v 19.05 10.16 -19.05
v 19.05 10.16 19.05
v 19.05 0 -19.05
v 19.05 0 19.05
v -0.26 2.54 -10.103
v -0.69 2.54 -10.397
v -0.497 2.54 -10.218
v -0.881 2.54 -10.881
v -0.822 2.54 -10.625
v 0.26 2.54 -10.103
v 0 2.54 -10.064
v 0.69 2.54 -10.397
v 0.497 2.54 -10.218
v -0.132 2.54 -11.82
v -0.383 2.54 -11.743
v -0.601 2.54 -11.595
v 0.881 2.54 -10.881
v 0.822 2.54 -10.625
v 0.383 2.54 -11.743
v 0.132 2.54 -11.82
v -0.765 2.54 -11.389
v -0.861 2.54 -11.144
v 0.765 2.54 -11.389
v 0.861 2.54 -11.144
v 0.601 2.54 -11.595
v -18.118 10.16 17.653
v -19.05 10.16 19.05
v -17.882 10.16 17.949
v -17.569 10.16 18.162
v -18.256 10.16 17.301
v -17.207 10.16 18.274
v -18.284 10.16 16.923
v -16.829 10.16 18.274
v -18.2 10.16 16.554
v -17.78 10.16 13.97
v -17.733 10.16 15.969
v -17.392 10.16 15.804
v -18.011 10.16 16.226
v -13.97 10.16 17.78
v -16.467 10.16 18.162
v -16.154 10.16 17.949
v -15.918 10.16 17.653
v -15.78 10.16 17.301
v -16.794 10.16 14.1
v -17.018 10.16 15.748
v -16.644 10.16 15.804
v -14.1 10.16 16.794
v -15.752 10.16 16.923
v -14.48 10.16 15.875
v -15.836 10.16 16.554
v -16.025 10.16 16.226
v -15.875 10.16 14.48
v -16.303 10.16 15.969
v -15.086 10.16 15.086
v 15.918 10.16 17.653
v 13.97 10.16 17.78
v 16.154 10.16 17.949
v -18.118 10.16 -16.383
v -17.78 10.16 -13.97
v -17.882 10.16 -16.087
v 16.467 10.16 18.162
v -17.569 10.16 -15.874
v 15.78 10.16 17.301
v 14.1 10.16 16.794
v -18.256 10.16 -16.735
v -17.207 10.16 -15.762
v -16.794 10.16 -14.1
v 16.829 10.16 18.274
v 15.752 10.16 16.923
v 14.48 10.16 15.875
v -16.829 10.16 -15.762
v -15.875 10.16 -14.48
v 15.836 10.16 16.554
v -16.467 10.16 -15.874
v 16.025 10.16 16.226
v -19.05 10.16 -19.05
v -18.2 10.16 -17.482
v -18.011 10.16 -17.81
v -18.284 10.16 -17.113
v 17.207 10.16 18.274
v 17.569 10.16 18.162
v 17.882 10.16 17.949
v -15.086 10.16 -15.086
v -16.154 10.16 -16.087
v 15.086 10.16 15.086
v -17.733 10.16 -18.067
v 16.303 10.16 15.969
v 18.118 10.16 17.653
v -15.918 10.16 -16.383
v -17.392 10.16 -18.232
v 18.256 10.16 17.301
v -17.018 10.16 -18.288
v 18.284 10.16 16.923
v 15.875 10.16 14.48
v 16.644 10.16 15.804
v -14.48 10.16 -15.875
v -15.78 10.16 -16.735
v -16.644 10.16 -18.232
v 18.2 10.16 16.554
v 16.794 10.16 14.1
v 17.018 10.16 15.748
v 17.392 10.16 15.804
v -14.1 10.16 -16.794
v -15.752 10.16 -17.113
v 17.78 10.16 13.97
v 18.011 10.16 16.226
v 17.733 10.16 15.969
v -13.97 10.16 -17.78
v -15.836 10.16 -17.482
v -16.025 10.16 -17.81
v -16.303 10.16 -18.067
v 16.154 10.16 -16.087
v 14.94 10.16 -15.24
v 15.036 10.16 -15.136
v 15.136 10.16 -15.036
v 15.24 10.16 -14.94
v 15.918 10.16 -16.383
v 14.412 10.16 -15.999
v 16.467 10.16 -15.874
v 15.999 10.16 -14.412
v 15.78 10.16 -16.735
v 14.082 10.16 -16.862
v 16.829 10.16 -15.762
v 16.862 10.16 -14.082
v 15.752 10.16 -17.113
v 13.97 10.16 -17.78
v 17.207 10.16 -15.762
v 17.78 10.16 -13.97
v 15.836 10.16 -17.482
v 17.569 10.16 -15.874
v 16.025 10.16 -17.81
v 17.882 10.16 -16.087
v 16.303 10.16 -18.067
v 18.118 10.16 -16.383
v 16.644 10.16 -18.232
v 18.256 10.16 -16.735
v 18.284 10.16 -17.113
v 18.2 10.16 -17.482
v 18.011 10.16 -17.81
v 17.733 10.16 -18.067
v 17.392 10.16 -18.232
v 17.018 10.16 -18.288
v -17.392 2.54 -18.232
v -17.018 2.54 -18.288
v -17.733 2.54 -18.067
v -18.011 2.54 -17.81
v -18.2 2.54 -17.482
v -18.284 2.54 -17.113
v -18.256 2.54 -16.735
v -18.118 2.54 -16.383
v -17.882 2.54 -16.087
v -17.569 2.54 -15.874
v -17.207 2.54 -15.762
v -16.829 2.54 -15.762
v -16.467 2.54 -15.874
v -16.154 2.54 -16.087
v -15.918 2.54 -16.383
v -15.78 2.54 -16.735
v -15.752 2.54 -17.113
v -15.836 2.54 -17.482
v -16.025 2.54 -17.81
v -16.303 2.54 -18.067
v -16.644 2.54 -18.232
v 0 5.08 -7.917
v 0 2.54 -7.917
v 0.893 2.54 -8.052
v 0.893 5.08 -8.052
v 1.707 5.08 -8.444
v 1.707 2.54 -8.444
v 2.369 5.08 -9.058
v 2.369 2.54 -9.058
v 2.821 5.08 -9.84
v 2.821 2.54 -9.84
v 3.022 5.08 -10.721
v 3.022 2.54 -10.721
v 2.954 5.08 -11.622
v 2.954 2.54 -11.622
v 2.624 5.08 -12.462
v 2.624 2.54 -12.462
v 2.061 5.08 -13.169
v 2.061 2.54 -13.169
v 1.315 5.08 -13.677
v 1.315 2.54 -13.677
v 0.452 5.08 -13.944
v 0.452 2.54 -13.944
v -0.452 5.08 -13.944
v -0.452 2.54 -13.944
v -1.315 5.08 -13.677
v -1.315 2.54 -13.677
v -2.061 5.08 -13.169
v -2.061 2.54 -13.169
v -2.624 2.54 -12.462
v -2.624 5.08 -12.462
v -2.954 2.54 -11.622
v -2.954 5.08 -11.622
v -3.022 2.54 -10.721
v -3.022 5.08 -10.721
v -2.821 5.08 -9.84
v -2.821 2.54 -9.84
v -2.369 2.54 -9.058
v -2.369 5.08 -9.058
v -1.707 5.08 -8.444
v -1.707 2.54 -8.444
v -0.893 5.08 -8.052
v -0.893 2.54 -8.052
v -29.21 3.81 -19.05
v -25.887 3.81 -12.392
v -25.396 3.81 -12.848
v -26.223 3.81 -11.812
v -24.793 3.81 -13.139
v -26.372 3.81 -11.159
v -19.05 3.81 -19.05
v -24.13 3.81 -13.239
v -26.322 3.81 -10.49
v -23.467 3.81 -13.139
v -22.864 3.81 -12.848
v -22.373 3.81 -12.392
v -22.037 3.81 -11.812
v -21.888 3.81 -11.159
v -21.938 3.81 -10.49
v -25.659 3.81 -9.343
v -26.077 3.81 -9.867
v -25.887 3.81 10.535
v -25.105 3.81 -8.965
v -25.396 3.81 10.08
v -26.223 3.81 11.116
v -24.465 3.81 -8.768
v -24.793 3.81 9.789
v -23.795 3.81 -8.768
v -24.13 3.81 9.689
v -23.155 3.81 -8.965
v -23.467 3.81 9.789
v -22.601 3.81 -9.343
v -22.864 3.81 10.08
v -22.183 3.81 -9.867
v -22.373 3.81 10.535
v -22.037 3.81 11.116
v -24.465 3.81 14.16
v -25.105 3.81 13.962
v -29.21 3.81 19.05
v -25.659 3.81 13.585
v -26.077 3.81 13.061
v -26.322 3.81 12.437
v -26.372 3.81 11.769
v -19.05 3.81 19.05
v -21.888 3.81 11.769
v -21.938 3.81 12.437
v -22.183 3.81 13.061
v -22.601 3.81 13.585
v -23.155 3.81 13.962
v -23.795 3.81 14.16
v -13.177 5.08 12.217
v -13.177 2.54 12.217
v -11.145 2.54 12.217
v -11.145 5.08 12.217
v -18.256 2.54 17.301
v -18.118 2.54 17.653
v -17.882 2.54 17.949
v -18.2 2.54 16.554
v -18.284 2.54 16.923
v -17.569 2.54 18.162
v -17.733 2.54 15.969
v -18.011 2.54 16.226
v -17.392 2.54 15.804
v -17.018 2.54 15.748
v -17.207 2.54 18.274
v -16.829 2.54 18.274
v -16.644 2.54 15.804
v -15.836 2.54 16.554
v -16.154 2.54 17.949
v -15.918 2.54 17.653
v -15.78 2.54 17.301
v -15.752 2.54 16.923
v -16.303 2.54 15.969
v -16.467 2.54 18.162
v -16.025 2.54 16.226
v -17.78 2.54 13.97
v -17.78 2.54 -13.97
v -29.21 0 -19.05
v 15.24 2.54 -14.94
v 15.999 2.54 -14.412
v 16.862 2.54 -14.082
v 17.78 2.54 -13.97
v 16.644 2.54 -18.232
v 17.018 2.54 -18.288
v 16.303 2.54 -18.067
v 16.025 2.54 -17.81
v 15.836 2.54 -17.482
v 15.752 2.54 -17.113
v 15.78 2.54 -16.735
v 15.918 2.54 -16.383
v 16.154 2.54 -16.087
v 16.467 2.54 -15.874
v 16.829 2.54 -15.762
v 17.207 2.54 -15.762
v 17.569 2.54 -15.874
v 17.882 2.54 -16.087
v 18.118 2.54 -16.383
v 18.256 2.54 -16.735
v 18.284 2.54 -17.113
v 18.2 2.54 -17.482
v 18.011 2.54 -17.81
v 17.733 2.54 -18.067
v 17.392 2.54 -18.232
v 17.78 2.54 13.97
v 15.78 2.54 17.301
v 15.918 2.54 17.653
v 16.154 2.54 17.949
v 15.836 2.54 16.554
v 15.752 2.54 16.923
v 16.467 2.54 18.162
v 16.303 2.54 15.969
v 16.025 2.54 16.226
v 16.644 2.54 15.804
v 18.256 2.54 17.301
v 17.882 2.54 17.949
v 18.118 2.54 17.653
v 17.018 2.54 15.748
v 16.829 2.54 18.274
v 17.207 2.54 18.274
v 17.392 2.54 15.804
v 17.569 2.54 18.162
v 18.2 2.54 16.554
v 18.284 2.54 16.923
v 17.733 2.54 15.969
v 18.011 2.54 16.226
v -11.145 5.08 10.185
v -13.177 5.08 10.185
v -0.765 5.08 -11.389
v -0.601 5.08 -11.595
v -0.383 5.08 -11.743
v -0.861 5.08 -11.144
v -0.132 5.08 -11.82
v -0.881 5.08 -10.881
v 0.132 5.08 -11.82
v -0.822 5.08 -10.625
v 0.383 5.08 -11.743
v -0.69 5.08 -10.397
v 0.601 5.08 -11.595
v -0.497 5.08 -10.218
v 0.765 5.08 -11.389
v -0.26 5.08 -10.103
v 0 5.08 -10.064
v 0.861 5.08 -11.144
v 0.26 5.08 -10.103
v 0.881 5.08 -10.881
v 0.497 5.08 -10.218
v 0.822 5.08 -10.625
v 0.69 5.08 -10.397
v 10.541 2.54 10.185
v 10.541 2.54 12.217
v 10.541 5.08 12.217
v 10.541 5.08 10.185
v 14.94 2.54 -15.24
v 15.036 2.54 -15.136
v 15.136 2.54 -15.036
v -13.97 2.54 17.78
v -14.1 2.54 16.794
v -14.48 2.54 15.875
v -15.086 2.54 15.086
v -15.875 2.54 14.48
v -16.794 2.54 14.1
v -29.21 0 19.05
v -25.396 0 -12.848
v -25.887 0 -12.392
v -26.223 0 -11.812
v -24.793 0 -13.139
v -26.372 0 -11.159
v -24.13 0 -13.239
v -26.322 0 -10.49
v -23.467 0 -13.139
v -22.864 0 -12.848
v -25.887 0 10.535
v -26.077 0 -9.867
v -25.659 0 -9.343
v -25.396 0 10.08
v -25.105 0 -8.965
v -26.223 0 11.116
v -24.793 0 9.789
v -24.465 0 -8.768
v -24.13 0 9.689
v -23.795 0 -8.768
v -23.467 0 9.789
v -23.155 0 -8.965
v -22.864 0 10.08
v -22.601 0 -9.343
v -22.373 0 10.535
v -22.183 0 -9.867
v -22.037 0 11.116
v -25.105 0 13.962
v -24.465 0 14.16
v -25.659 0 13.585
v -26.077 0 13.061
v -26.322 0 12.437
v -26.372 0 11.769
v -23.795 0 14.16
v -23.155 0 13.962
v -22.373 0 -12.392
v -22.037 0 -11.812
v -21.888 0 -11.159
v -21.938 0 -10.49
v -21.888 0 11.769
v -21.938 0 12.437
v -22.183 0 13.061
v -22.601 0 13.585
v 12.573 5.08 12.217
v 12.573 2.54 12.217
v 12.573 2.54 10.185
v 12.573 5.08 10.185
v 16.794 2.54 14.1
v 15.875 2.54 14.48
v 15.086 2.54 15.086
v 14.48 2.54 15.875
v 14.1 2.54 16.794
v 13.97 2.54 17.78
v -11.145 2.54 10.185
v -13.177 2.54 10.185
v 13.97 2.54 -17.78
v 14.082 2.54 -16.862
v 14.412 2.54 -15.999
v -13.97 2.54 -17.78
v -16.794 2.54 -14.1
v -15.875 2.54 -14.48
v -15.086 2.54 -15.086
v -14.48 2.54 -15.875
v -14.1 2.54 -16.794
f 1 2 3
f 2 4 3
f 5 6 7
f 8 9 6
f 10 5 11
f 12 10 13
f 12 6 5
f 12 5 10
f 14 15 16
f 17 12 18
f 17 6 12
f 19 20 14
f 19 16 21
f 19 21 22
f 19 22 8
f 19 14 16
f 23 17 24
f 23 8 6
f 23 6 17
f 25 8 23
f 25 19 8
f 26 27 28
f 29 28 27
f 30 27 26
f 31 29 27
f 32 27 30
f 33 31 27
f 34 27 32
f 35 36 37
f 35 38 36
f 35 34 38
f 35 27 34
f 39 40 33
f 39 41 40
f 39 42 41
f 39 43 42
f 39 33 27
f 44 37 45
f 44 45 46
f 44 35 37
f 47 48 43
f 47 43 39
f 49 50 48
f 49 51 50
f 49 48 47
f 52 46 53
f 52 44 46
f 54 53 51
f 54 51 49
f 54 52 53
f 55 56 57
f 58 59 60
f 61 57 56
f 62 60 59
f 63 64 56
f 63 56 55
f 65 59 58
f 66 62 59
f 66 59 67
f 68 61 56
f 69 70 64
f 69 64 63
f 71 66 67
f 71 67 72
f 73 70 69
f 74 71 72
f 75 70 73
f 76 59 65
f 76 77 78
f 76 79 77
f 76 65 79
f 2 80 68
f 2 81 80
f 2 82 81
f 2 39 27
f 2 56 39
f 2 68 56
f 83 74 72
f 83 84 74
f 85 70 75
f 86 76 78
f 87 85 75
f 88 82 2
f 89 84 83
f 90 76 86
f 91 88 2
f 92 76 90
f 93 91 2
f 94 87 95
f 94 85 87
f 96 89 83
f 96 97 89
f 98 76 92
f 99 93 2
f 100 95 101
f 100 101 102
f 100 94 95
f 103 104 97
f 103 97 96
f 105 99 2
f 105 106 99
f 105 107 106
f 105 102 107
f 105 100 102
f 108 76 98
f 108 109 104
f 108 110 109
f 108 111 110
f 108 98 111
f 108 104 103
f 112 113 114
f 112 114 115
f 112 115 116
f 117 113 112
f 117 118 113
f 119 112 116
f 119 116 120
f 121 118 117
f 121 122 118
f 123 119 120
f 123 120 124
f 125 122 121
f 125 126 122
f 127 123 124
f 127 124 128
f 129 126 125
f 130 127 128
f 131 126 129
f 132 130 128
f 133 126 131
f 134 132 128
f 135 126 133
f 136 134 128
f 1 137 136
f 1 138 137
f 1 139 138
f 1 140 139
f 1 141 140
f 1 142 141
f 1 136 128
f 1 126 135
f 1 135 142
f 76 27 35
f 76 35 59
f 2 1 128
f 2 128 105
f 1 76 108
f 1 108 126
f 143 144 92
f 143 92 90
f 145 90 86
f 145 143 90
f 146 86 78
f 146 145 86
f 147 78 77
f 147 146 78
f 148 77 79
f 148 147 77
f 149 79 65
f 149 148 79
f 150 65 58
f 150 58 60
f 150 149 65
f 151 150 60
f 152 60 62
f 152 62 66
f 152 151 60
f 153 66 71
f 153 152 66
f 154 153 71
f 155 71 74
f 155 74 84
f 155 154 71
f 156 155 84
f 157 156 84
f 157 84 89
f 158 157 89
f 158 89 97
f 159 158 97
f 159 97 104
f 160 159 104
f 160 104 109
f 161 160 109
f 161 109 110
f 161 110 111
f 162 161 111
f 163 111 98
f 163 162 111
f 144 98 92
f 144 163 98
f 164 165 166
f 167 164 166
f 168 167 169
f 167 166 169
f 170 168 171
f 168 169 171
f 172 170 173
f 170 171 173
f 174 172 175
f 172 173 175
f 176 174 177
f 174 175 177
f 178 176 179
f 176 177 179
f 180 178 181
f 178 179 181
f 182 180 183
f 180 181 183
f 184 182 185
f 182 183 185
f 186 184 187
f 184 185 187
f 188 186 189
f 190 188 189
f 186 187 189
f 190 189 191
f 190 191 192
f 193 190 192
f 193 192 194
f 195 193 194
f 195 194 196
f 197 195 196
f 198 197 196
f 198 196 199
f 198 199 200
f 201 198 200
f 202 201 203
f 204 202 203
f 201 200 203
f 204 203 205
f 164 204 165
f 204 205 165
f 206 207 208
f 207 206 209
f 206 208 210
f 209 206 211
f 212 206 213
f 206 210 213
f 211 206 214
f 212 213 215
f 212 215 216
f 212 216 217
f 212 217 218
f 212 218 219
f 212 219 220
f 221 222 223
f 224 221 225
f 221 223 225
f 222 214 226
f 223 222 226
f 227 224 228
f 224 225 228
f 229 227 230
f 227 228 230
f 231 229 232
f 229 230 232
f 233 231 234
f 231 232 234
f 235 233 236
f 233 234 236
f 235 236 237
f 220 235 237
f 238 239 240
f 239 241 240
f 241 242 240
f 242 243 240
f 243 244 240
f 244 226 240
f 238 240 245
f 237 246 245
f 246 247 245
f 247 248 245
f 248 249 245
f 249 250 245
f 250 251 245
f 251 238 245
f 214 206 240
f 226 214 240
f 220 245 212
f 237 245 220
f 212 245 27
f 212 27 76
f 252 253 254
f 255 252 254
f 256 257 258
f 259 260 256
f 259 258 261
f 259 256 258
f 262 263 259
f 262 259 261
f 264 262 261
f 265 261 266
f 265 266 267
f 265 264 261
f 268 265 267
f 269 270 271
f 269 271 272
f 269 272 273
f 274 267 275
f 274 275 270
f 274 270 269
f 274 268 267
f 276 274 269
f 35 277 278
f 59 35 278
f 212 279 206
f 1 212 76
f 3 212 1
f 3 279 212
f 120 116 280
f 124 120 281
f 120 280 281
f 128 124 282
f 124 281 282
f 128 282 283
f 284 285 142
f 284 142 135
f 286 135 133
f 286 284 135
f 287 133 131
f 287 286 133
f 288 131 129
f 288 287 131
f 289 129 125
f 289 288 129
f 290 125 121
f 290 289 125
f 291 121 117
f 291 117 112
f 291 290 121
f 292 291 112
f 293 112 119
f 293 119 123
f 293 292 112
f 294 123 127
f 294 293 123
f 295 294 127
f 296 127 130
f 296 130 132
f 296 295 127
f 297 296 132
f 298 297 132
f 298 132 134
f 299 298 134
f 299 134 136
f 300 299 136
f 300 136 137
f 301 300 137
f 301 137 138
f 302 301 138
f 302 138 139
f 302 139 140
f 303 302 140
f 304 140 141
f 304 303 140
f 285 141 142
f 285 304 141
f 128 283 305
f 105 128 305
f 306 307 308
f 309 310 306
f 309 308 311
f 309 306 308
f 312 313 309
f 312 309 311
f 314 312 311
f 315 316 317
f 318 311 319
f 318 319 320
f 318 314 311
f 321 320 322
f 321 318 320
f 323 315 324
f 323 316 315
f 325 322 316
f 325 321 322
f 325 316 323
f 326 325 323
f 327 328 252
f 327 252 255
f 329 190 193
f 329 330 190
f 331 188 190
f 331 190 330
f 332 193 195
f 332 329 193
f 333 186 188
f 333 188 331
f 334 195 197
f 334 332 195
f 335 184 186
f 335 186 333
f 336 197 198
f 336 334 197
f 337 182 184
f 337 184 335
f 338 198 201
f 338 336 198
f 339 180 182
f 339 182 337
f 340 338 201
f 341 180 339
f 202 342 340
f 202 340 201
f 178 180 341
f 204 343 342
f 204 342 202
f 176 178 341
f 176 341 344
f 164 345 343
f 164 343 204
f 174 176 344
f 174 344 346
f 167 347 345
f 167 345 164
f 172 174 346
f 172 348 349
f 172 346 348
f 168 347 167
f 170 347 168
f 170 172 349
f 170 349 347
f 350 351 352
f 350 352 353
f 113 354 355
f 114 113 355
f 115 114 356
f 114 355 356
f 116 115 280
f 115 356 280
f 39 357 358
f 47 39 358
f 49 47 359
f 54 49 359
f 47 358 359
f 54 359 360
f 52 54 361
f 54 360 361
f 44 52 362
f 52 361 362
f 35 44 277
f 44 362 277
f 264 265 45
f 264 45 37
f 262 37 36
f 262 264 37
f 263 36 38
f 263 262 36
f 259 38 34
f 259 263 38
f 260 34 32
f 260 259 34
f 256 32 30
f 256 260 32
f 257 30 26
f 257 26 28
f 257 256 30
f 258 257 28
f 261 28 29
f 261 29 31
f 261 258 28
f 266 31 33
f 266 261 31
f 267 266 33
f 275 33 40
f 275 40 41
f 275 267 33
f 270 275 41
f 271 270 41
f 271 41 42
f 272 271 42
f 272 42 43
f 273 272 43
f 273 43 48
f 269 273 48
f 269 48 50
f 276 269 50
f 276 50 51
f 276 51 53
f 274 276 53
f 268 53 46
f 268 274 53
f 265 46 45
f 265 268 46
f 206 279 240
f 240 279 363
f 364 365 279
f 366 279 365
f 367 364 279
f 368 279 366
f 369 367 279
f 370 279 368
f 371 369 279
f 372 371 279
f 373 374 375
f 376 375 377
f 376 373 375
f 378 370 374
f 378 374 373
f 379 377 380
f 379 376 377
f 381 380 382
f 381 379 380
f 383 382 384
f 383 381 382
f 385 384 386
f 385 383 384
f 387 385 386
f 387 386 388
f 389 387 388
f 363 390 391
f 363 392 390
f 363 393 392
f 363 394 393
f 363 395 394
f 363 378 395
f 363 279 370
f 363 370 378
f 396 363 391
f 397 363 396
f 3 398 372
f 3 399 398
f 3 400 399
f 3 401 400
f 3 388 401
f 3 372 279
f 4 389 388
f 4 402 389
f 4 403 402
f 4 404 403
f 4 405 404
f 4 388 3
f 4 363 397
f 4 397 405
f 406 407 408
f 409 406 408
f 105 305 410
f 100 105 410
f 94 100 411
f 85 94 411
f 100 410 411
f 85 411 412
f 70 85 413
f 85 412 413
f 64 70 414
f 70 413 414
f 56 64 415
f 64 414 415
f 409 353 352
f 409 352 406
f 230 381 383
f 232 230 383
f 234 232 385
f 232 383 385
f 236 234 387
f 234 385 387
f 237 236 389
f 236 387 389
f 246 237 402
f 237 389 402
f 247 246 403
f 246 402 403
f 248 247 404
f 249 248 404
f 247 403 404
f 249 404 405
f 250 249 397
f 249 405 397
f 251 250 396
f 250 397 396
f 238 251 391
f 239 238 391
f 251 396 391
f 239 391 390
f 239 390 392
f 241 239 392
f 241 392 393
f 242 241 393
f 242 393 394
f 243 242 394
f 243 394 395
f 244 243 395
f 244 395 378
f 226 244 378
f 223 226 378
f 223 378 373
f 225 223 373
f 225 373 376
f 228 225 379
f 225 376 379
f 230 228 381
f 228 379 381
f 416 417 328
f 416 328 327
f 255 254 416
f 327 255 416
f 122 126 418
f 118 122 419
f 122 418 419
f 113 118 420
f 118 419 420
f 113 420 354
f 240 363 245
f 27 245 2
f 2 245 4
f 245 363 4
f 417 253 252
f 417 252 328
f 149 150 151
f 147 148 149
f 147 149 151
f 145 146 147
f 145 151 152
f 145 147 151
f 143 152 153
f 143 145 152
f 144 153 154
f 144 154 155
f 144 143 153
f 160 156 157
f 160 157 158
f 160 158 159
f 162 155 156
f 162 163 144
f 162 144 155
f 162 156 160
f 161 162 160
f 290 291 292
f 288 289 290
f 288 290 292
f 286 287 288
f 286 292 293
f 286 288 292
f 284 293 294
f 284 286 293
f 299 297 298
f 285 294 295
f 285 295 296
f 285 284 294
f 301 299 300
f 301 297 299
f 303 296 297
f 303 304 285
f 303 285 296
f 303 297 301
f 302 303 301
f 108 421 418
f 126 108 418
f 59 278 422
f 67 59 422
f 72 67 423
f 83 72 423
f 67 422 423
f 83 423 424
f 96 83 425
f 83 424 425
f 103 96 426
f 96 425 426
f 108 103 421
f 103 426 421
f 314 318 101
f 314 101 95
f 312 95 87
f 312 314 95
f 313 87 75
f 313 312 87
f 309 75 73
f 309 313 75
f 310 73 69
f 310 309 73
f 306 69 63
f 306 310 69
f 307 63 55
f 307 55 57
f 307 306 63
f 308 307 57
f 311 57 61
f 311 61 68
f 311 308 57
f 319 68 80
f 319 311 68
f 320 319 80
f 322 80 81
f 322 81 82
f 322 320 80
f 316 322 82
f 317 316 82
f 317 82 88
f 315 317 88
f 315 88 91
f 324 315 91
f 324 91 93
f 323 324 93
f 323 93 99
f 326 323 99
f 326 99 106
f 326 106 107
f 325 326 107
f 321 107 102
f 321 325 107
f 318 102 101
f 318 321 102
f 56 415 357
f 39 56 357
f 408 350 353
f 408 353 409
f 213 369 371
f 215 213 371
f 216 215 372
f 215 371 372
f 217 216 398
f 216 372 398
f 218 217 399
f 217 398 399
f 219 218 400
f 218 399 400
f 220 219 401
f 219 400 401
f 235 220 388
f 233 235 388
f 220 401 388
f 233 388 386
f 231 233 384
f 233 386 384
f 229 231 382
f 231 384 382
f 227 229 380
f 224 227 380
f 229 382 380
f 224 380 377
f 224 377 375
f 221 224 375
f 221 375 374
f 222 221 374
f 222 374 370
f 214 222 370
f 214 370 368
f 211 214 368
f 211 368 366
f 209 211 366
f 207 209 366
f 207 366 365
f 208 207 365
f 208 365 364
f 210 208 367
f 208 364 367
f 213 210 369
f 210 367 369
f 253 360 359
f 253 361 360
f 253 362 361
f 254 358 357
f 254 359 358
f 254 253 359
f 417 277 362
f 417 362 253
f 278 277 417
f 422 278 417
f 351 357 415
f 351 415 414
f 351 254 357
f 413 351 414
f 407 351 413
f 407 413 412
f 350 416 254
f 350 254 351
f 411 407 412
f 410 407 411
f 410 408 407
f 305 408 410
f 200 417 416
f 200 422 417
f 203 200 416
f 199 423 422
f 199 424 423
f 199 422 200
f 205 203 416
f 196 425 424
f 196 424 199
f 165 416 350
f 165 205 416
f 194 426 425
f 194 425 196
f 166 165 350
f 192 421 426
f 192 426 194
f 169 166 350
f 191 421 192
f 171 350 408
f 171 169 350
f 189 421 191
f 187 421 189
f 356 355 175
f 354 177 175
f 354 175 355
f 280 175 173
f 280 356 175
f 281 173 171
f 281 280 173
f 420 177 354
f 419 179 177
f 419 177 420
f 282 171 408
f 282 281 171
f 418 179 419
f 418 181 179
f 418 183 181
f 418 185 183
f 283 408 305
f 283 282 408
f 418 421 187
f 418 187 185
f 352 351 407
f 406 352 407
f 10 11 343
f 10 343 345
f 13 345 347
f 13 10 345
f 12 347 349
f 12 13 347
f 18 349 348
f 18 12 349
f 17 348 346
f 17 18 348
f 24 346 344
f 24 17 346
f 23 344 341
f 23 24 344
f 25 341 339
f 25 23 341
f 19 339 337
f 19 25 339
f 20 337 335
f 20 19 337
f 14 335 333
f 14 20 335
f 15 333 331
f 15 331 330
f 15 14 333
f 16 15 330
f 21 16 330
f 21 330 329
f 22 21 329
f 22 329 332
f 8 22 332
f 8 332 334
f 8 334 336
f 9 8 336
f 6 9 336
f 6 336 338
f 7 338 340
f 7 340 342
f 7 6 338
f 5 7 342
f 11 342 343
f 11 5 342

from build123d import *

# Parameters (mm, degrees)
SKETCH1_W           = 38.1
SKETCH1_H           = 38.1
BOSS_EXTRUDE1_DEPTH = 2.54
SKETCH2_W           = 38.1
SKETCH2_H           = 38.1
SKETCH2_R           = 1.27
BOSS_EXTRUDE2_DEPTH = 7.62
SKETCH4_R           = 3.030246623
SKETCH4_R_2         = 0.88307969
SKETCH4_W           = 2.032
SKETCH4_H           = 2.032
BOSS_EXTRUDE3_DEPTH = 2.54
SKETCH7_W           = 10.16
SKETCH7_H           = 38.1
SKETCH7_R           = 2.2479
BOSS_EXTRUDE5_DEPTH = 3.81


with BuildPart() as part:
    # Sketch1 → Boss-Extrude1 (new body)
    with BuildSketch(Plane(origin=(0, 0, 0), x_dir=(1, 0, 0), z_dir=(0, 1, 0))):
        Rectangle(SKETCH1_W, SKETCH1_H)
    extrude(amount=BOSS_EXTRUDE1_DEPTH)

    # Sketch2 → Boss-Extrude2 (add)
    # profile 1 of 2: a face of its own
    with BuildSketch(Plane(origin=(0, 2.54, 0), x_dir=(1, 0, 0), z_dir=(0, 1, 0))):
        Rectangle(SKETCH2_W, SKETCH2_H)
        with Locations(Location((-17.018, -17.018, 0), (0, 0, 90))):
            Circle(SKETCH2_R, mode=Mode.SUBTRACT)
        with Locations(Location((17.018, -17.018, 0), (0, 0, 90))):
            Circle(SKETCH2_R, mode=Mode.SUBTRACT)
        with BuildLine():
            Line((14.940193669, 15.24), (15.24, 15.24))
            Line((15.24, 15.24), (15.24, 14.940193669))
            ThreePointArc((15.24, 14.940193669), (16.420507838, 14.220803312), (17.78, 13.97))
            Line((17.78, 13.97), (17.78, -13.97))
            ThreePointArc((17.78, -13.97), (15.085923164, -15.085923164), (13.97, -17.78))
            Line((13.97, -17.78), (-13.97, -17.78))
            ThreePointArc((-13.97, -17.78), (-15.085923164, -15.085923164), (-17.78, -13.97))
            Line((-17.78, -13.97), (-17.78, 13.97))
            ThreePointArc((-17.78, 13.97), (-15.085923164, 15.085923164), (-13.97, 17.78))
            Line((-13.97, 17.78), (13.97, 17.78))
            ThreePointArc((13.97, 17.78), (14.220803312, 16.420507838), (14.940193669, 15.24))
        make_face(mode=Mode.SUBTRACT)
        with Locations(Location((-17.018, 17.018, 0), (0, 0, 90))):
            Circle(SKETCH2_R, mode=Mode.SUBTRACT)
        with Locations(Location((17.018, 17.018, 0), (0, 0, 90))):
            Circle(SKETCH2_R, mode=Mode.SUBTRACT)
    # profile 2 of 2: a face of its own
    with BuildSketch(Plane(origin=(0, 2.54, 0), x_dir=(1, 0, 0), z_dir=(0, 1, 0))):
        with BuildLine():
            Line((15.24, 14.940193669), (15.24, 15.24))
            Line((15.24, 15.24), (14.940193669, 15.24))
            ThreePointArc((14.940193669, 15.24), (15.085923164, 15.085923164), (15.24, 14.940193669))
        make_face()
    extrude(amount=BOSS_EXTRUDE2_DEPTH)

    # Sketch4 → Boss-Extrude3 (add)
    # profile 1 of 3: a face of its own
    with BuildSketch(Plane(origin=(0, 2.54, 0), x_dir=(1, 0, 0), z_dir=(0, 1, 0))):
        with Locations(Location((0, 10.947233516, 0), (0, 0, 270))):
            Circle(SKETCH4_R)
        with Locations(Location((0, 10.947233516, 0), (0, 0, 270))):
            Circle(SKETCH4_R_2, mode=Mode.SUBTRACT)
    # profile 2 of 3: a face of its own
    with BuildSketch(Plane(origin=(0, 2.54, 0), x_dir=(1, 0, 0), z_dir=(0, 1, 0))):
        with Locations((-12.16137027, -11.201233516)):
            Rectangle(SKETCH4_W, SKETCH4_H)
    # profile 3 of 3: a face of its own
    with BuildSketch(Plane(origin=(0, 2.54, 0), x_dir=(1, 0, 0), z_dir=(0, 1, 0))):
        with Locations((11.557, -11.201233516)):
            Rectangle(SKETCH4_W, SKETCH4_H)
    extrude(amount=BOSS_EXTRUDE3_DEPTH)

    # Sketch7 → Boss-Extrude5 (add)
    with BuildSketch(Plane.XZ):
        with Locations((-24.13, 0)):
            Rectangle(SKETCH7_W, SKETCH7_H)
        with Locations(Location((-24.13, -10.990632384, 0), (0, 0, 270))):
            Circle(SKETCH7_R, mode=Mode.SUBTRACT)
        with Locations(Location((-24.13, 11.937008295, 0), (0, 0, 270))):
            Circle(SKETCH7_R, mode=Mode.SUBTRACT)
    extrude(amount=-BOSS_EXTRUDE5_DEPTH)


solid = part.part
